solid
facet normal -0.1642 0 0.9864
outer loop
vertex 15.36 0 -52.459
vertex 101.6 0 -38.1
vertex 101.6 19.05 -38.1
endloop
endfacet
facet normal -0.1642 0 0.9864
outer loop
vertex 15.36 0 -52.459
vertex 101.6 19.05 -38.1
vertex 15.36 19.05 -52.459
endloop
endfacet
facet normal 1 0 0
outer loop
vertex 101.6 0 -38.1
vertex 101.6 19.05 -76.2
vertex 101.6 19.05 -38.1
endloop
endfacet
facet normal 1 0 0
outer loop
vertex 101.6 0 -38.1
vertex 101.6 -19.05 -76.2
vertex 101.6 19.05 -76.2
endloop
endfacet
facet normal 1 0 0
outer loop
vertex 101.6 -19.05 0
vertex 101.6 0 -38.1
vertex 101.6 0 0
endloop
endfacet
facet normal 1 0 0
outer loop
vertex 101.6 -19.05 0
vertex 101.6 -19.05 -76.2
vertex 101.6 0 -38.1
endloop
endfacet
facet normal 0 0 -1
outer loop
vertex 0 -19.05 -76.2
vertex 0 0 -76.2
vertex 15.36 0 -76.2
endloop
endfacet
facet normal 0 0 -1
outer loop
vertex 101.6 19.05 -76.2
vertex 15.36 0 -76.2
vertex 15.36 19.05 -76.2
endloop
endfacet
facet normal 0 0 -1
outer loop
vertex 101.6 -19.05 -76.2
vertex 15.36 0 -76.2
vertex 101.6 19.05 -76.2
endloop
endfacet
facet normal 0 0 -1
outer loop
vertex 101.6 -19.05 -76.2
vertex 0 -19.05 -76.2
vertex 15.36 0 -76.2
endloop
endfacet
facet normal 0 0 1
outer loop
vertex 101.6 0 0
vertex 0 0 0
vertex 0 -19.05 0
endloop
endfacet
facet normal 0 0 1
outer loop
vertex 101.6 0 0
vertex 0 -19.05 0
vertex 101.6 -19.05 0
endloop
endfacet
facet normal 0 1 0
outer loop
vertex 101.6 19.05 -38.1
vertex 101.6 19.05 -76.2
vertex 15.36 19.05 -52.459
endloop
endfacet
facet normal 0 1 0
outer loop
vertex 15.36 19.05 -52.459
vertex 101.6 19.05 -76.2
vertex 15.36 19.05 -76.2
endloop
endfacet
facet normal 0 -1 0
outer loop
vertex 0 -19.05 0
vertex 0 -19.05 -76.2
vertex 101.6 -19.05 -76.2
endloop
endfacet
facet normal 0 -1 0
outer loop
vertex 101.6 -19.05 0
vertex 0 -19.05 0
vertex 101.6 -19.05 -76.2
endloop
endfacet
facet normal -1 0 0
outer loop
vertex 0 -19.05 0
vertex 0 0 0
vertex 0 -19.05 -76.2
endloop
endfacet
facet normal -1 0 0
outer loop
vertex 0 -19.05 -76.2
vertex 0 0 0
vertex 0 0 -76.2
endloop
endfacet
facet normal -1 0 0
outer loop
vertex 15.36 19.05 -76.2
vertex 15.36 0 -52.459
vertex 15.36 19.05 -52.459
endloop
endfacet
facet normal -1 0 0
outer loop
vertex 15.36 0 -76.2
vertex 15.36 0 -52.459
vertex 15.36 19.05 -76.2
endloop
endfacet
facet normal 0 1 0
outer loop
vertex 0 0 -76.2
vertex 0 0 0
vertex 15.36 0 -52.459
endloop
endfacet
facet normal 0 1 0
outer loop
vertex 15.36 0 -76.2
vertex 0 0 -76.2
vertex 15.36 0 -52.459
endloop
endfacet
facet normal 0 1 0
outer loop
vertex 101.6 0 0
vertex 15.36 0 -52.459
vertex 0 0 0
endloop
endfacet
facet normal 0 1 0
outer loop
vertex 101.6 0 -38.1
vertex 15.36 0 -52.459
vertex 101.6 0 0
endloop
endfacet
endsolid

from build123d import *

# Parameters (mm, degrees)
SKETCH14_W     = 101.6
SKETCH14_H     = 76.2
EXTRUDE5_DEPTH = 19.05
EXTRUDE6_DEPTH = 19.05


with BuildPart() as part:
    # Sketch14 → Extrude5 (new body)
    with BuildSketch(Plane(origin=(0, 0, 0), x_dir=(1, 0, 0), z_dir=(0, 1, 0))):
        with Locations((50.8, 38.1)):
            Rectangle(SKETCH14_W, SKETCH14_H)
    extrude(amount=-EXTRUDE5_DEPTH)

    # Sketch15 → Extrude6 (add)
    with BuildSketch(Plane(origin=(0, 0, 0), x_dir=(1, 0, 0), z_dir=(0, 1, 0))):
        Polygon((101.6, 38.1), (15.359566814, 52.459402124), (15.359566814, 76.2), (101.6, 76.2), align=None)
    extrude(amount=EXTRUDE6_DEPTH)


solid = part.part
